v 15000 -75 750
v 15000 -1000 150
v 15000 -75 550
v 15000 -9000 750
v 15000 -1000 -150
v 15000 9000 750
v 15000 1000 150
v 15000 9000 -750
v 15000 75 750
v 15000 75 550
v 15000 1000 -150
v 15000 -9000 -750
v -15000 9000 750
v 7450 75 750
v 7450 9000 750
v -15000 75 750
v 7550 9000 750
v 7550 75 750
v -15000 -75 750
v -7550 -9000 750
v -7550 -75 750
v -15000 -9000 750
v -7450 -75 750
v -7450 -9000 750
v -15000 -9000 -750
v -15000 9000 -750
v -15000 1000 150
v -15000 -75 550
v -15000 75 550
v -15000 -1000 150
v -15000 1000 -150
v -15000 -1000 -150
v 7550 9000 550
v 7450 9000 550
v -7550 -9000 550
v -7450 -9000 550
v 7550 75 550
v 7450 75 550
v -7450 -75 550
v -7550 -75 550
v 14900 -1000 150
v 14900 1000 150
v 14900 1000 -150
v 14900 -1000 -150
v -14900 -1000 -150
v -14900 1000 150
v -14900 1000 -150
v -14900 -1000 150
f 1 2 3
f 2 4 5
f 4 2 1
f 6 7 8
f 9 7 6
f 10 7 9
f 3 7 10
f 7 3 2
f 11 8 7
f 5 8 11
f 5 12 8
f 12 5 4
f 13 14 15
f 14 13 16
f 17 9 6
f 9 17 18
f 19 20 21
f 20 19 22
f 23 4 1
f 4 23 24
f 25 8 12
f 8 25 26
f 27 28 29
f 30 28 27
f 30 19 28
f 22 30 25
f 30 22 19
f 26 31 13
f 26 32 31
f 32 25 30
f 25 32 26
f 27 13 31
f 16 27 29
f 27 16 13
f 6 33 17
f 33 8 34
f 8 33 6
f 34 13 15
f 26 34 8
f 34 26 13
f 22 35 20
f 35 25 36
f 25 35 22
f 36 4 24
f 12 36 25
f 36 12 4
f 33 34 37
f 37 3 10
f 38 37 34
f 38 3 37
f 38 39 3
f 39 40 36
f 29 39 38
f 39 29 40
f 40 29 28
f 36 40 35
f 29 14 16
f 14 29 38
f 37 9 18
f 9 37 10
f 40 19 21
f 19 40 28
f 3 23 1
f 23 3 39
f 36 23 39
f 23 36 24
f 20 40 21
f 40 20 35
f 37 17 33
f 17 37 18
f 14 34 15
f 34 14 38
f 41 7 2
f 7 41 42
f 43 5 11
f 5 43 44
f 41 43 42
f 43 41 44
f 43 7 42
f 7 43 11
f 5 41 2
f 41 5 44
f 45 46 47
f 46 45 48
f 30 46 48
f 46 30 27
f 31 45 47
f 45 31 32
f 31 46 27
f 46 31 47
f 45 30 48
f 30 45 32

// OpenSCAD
// =========================================================================
// GRUMMAN-STYLED INFLATABLE CARRIER - EMBEDDED SOLID-STATE HARNESS
// MANUFACTURER: HUNTINGTON INGALLS / NEWPORT NEWS SHIPBUILDING
// MATERIAL SPECIFICATION: SOLID-STATE CONDUIT IN GRADE 5 TITANIUM
// =========================================================================

module titanium_harness_plate(length=30000, width=18000, thickness=1500) {
    difference() {
        // Core Grade 5 Titanium Flatbed Hinge Plate
        cube([length, width, thickness], center=true);
        
        // Longitudinal Conduit Channel for Embedded 3oz Copper Power Bus
        translate([0, 0, thickness/2 - 100])
            cube([length + 20, 150, 200], center=true);
            
        // Left Divergent Feed for Continuous 12V Blower Power Routing
        translate([-length/4, -width/4, thickness/2 - 100])
            cube([100, width/2, 200], center=true);
            
        // Right Divergent Feed for Submersible Bilge Sump Power Routing
        translate([length/4, width/4, thickness/2 - 100])
            cube([100, width/2, 200], center=true);
            
        // Pocket Cuts at Hinge Faces for Flush 24K Gold Lattice Snap Junctions
        translate([length/2 - 50, 0, 0])
            cube([100, 2000, 300], center=true);
        translate([-length/2 + 50, 0, 0])
            cube([100, 2000, 300], center=true);
    }
}

// Render structural segment with integrated wiring cavities
titanium_harness_plate();
